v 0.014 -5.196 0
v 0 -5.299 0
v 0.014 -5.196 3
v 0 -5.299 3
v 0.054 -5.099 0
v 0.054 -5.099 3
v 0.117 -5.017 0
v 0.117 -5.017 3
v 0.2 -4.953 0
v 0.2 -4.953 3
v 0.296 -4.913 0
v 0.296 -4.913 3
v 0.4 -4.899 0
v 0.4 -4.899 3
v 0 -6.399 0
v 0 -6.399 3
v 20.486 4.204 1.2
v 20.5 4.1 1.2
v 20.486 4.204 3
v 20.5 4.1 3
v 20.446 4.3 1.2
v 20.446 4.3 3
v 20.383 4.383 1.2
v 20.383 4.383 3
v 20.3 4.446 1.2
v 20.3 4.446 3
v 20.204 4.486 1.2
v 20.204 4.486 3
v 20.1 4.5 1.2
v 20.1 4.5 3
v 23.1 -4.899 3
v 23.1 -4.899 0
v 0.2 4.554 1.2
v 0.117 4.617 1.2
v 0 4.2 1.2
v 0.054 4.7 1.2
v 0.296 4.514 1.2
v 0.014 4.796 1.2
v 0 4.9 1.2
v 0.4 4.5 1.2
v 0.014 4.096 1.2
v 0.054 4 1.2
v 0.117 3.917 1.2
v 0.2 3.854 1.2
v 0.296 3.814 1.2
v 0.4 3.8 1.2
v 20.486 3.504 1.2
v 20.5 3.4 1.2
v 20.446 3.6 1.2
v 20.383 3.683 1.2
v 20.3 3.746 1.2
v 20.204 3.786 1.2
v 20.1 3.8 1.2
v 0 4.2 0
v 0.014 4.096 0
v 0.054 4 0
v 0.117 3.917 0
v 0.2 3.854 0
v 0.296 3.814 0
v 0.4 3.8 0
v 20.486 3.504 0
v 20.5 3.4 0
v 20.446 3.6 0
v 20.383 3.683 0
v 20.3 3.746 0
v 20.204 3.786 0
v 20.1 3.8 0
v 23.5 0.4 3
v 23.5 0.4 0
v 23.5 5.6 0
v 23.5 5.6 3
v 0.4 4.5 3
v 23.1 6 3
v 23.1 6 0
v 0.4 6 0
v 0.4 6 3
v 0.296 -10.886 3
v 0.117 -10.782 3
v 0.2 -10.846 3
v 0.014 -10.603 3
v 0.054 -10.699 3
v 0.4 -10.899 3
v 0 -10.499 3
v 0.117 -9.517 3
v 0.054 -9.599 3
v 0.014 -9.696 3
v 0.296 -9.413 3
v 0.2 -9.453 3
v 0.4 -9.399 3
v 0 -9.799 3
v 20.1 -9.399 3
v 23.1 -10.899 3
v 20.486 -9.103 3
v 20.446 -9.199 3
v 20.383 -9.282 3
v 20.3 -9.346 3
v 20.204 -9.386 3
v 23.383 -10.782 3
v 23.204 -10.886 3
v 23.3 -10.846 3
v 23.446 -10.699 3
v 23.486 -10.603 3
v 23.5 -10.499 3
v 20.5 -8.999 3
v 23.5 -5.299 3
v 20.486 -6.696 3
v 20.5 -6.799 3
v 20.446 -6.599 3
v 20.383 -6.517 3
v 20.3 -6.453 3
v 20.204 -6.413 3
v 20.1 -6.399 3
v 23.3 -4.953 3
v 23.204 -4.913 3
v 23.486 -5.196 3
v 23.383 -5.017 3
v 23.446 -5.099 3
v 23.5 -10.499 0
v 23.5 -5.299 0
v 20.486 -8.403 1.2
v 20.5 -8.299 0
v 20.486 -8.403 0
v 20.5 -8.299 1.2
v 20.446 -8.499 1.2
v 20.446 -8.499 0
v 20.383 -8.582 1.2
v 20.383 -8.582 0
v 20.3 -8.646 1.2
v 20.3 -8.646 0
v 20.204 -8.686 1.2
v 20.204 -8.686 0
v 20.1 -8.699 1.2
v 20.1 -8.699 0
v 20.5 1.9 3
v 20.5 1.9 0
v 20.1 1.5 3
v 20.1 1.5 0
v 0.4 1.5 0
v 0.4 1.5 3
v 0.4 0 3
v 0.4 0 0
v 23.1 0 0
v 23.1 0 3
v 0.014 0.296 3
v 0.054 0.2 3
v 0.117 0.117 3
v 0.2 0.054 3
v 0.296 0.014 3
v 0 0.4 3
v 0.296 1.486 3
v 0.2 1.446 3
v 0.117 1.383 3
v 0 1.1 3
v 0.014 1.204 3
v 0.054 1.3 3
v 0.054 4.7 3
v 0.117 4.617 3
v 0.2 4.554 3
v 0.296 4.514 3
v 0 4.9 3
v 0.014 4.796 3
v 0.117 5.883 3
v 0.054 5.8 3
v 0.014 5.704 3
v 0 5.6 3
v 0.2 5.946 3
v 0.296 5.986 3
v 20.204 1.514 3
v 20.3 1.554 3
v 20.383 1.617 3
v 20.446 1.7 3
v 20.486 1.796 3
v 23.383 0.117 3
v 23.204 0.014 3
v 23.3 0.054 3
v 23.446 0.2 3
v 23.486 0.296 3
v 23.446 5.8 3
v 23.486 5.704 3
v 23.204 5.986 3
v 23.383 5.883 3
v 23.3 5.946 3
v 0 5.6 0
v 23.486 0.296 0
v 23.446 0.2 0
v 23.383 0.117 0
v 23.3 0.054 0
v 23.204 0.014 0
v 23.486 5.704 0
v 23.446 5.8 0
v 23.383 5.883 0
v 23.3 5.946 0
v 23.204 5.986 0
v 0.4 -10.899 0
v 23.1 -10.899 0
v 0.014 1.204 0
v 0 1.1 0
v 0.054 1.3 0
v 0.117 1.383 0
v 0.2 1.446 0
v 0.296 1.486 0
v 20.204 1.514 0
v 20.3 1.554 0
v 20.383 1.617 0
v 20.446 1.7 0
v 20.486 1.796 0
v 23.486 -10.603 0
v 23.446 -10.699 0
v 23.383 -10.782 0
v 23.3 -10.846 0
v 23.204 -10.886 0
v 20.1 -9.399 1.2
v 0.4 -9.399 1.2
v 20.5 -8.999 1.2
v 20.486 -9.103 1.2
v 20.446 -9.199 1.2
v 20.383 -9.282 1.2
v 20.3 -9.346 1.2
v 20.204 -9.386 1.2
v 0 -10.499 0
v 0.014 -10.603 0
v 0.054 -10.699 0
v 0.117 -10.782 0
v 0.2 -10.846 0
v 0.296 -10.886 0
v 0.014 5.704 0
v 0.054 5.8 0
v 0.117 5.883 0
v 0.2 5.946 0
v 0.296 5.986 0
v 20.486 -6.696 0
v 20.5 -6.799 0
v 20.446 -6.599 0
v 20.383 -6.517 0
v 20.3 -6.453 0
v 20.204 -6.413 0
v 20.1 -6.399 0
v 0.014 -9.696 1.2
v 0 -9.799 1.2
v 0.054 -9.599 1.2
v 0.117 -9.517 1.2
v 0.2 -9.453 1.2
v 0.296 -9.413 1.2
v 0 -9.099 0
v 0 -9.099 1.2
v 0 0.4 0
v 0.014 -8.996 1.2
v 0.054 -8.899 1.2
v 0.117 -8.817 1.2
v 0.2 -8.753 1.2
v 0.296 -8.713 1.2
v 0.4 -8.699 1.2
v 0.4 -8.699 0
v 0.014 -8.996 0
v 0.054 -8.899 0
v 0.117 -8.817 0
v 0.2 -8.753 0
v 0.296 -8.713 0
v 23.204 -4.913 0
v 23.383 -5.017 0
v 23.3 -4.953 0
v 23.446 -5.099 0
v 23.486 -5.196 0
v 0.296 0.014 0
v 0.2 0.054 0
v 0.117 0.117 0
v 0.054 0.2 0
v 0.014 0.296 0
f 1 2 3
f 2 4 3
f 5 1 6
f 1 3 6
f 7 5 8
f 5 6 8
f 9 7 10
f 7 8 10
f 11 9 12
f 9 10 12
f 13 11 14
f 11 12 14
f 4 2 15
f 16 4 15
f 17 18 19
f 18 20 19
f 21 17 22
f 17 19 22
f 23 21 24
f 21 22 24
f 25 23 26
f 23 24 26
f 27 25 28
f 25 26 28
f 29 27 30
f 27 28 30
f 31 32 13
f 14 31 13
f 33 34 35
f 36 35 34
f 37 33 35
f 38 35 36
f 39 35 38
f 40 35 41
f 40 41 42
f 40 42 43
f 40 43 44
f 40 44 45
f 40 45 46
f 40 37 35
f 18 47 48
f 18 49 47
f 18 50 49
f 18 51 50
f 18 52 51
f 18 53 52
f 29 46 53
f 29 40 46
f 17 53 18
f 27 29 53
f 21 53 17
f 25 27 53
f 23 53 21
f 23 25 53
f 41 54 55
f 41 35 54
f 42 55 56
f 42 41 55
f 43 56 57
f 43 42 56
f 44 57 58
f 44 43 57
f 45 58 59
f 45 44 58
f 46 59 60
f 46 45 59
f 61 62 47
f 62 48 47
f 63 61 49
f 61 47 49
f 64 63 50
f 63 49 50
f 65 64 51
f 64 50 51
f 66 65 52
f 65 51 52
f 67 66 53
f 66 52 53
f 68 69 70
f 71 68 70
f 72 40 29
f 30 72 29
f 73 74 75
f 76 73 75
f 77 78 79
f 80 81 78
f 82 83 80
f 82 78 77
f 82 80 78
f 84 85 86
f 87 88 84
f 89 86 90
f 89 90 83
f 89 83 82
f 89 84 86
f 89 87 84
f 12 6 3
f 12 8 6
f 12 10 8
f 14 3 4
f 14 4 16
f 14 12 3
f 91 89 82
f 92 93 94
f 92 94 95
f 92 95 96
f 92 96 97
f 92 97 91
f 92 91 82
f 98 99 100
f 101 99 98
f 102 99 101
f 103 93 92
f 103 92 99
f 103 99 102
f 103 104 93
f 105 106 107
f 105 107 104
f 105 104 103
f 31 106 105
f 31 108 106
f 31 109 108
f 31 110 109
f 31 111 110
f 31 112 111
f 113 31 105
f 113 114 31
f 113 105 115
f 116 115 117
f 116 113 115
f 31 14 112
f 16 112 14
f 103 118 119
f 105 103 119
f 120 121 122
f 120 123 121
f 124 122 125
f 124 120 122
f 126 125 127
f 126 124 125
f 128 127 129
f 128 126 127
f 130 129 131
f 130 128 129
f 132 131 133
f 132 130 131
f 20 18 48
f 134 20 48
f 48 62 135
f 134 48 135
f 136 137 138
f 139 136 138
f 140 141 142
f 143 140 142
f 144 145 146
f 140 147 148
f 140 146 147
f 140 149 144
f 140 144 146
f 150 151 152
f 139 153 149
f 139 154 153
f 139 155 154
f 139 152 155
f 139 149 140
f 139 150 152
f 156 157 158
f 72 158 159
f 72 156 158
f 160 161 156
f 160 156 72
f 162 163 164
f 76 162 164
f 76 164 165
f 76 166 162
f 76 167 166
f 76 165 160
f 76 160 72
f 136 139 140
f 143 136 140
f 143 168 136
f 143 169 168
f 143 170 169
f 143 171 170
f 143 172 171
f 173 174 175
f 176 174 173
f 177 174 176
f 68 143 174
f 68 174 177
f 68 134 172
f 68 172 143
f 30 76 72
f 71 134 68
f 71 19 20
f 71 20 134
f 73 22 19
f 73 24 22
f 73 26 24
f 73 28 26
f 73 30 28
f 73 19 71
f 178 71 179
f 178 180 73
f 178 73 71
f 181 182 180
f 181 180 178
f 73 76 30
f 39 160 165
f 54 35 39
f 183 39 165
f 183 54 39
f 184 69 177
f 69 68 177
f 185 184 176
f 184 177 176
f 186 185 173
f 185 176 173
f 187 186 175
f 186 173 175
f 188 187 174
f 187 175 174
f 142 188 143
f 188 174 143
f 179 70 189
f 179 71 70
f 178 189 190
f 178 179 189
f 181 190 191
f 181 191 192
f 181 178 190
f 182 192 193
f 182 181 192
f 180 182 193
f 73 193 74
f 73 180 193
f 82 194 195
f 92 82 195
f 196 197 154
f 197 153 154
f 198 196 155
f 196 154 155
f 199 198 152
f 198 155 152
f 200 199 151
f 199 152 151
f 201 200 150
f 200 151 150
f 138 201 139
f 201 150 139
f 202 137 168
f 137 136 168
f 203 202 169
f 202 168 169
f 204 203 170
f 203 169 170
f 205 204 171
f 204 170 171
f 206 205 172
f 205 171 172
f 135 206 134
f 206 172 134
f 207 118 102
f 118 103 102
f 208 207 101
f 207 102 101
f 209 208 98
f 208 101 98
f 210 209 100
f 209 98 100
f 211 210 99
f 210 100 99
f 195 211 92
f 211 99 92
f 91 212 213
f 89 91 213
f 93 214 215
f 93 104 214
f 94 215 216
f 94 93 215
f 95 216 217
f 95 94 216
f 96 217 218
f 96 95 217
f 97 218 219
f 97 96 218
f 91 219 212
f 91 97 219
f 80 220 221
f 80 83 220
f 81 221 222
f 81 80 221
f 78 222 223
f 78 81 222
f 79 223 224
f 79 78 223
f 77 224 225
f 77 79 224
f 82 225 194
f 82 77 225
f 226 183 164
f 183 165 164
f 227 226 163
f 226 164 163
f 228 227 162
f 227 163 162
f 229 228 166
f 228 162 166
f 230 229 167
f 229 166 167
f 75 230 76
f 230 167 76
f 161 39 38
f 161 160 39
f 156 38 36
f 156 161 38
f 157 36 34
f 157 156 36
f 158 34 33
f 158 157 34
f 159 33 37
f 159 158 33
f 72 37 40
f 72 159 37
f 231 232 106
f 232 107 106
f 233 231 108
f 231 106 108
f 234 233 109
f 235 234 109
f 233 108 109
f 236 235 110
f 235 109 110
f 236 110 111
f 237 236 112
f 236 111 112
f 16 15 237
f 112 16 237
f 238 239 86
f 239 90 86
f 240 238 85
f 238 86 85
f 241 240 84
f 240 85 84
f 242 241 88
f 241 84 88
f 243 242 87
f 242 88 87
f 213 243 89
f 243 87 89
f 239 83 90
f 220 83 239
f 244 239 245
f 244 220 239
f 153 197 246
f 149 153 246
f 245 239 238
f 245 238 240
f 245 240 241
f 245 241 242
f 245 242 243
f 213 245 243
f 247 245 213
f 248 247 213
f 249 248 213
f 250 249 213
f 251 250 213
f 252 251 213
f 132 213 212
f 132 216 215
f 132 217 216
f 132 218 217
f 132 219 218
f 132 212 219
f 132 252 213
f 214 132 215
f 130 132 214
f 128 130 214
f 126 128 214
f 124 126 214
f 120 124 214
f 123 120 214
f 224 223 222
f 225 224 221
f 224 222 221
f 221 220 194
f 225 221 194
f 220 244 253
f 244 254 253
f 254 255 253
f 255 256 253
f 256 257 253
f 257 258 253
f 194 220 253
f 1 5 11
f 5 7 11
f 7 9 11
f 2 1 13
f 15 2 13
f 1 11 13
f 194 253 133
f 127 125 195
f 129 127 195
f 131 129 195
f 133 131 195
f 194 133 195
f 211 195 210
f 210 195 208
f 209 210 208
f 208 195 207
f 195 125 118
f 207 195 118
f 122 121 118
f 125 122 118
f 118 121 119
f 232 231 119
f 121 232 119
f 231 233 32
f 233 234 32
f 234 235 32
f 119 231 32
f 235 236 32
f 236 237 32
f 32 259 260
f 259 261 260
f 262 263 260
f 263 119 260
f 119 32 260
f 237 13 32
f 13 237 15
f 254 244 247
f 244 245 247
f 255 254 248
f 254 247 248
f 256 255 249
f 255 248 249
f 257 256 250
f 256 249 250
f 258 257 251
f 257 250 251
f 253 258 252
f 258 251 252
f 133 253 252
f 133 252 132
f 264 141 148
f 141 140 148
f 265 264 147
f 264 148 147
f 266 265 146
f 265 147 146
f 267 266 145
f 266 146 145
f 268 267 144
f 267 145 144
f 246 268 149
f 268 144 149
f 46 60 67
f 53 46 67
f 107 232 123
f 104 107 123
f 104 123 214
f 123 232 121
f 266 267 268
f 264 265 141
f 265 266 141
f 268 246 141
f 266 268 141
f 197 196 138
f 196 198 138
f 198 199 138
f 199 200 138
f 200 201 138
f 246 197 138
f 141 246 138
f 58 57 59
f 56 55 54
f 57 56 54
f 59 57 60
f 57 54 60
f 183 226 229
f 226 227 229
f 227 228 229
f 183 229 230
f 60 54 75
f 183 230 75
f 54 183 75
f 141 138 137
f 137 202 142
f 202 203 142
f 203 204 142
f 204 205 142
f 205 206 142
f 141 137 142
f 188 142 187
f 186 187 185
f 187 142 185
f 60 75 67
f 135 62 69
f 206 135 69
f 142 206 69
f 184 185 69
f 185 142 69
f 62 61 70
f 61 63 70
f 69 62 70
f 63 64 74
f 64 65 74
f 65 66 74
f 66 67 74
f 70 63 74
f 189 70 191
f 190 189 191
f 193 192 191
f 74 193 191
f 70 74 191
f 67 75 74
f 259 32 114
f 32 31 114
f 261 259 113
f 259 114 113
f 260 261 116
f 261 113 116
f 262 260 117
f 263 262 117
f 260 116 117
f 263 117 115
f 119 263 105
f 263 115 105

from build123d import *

# Parameters (mm, degrees)
BOSS_EXTRUDE1_DEPTH   = 3
BOSS_EXTRUDE1_2_DEPTH = 3
SKETCH2_4_W           = 20.5
SKETCH2_4_H           = 0.7
BOSS_EXTRUDE3_DEPTH   = 1.2
FILLET2_R             = 0.4
FILLET3_R             = 0.4


with BuildPart() as part:
    # Sketch2 → Boss-Extrude1 (new body)
    with BuildSketch(Plane.XY):
        Polygon((0, 1.5), (0, 0), (23.5, 0), (23.5, 6), (0, 6), (0, 4.5), (20.5, 4.5), (20.5, 1.5), align=None)
    extrude(amount=BOSS_EXTRUDE1_DEPTH)



with BuildPart() as body_2:
    # Sketch2 → Boss-Extrude1 2 (new body)
    with BuildSketch(Plane.XY):
        Polygon((20.5, -6.399471306), (20.5, -9.399471306), (0, -9.399471306), (0, -10.899471306), (23.5, -10.899471306), (23.5, -4.899471306), (0, -4.899471306), (0, -6.399471306), align=None)
    extrude(amount=BOSS_EXTRUDE1_2_DEPTH)


with BuildPart() as part_1:
    add(part.part)

    add(body_2.part)  # Boss-Extrude3 merges body 2
    # Sketch2<4> → Boss-Extrude3 (add)
    with BuildSketch(Plane.XY):
        with Locations((10.25, 4.15)):
            Rectangle(SKETCH2_4_W, SKETCH2_4_H)
        with Locations((10.25, -9.049471306)):
            Rectangle(SKETCH2_4_W, SKETCH2_4_H)
    extrude(amount=BOSS_EXTRUDE3_DEPTH)

    # Fillet2
    fillet2_edges = [part_1.edges().sort_by_distance(p)[0] for p in [
        (0, 4.5, 2.1),
        (20.5, 1.5, 1.5),
        (20.5, 3.8, 0.6),
        (20.5, 4.5, 2.1),
        (23.5, 6, 1.5),
        (23.5, 0, 1.5),
        (0, 0, 1.5),
        (0, 1.5, 1.5),
        (0, 3.8, 0.6),
        (0, 6, 1.5),
    ]]
    fillet(fillet2_edges, radius=FILLET2_R)

    # Fillet3
    fillet3_edges = [part_1.edges().sort_by_distance(p)[0] for p in [
        (23.5, -10.899471306, 1.5),
        (23.5, -4.899471306, 1.5),
        (20.5, -6.399471306, 1.5),
        (20.5, -9.399471306, 2.1),
        (20.5, -8.699471306, 0.6),
        (0, -10.899471306, 1.5),
        (0, -9.399471306, 2.1),
        (0, -8.699471306, 0.6),
        (0, -4.899471306, 1.5),
    ]]
    fillet(fillet3_edges, radius=FILLET3_R)


solid = part_1.part
